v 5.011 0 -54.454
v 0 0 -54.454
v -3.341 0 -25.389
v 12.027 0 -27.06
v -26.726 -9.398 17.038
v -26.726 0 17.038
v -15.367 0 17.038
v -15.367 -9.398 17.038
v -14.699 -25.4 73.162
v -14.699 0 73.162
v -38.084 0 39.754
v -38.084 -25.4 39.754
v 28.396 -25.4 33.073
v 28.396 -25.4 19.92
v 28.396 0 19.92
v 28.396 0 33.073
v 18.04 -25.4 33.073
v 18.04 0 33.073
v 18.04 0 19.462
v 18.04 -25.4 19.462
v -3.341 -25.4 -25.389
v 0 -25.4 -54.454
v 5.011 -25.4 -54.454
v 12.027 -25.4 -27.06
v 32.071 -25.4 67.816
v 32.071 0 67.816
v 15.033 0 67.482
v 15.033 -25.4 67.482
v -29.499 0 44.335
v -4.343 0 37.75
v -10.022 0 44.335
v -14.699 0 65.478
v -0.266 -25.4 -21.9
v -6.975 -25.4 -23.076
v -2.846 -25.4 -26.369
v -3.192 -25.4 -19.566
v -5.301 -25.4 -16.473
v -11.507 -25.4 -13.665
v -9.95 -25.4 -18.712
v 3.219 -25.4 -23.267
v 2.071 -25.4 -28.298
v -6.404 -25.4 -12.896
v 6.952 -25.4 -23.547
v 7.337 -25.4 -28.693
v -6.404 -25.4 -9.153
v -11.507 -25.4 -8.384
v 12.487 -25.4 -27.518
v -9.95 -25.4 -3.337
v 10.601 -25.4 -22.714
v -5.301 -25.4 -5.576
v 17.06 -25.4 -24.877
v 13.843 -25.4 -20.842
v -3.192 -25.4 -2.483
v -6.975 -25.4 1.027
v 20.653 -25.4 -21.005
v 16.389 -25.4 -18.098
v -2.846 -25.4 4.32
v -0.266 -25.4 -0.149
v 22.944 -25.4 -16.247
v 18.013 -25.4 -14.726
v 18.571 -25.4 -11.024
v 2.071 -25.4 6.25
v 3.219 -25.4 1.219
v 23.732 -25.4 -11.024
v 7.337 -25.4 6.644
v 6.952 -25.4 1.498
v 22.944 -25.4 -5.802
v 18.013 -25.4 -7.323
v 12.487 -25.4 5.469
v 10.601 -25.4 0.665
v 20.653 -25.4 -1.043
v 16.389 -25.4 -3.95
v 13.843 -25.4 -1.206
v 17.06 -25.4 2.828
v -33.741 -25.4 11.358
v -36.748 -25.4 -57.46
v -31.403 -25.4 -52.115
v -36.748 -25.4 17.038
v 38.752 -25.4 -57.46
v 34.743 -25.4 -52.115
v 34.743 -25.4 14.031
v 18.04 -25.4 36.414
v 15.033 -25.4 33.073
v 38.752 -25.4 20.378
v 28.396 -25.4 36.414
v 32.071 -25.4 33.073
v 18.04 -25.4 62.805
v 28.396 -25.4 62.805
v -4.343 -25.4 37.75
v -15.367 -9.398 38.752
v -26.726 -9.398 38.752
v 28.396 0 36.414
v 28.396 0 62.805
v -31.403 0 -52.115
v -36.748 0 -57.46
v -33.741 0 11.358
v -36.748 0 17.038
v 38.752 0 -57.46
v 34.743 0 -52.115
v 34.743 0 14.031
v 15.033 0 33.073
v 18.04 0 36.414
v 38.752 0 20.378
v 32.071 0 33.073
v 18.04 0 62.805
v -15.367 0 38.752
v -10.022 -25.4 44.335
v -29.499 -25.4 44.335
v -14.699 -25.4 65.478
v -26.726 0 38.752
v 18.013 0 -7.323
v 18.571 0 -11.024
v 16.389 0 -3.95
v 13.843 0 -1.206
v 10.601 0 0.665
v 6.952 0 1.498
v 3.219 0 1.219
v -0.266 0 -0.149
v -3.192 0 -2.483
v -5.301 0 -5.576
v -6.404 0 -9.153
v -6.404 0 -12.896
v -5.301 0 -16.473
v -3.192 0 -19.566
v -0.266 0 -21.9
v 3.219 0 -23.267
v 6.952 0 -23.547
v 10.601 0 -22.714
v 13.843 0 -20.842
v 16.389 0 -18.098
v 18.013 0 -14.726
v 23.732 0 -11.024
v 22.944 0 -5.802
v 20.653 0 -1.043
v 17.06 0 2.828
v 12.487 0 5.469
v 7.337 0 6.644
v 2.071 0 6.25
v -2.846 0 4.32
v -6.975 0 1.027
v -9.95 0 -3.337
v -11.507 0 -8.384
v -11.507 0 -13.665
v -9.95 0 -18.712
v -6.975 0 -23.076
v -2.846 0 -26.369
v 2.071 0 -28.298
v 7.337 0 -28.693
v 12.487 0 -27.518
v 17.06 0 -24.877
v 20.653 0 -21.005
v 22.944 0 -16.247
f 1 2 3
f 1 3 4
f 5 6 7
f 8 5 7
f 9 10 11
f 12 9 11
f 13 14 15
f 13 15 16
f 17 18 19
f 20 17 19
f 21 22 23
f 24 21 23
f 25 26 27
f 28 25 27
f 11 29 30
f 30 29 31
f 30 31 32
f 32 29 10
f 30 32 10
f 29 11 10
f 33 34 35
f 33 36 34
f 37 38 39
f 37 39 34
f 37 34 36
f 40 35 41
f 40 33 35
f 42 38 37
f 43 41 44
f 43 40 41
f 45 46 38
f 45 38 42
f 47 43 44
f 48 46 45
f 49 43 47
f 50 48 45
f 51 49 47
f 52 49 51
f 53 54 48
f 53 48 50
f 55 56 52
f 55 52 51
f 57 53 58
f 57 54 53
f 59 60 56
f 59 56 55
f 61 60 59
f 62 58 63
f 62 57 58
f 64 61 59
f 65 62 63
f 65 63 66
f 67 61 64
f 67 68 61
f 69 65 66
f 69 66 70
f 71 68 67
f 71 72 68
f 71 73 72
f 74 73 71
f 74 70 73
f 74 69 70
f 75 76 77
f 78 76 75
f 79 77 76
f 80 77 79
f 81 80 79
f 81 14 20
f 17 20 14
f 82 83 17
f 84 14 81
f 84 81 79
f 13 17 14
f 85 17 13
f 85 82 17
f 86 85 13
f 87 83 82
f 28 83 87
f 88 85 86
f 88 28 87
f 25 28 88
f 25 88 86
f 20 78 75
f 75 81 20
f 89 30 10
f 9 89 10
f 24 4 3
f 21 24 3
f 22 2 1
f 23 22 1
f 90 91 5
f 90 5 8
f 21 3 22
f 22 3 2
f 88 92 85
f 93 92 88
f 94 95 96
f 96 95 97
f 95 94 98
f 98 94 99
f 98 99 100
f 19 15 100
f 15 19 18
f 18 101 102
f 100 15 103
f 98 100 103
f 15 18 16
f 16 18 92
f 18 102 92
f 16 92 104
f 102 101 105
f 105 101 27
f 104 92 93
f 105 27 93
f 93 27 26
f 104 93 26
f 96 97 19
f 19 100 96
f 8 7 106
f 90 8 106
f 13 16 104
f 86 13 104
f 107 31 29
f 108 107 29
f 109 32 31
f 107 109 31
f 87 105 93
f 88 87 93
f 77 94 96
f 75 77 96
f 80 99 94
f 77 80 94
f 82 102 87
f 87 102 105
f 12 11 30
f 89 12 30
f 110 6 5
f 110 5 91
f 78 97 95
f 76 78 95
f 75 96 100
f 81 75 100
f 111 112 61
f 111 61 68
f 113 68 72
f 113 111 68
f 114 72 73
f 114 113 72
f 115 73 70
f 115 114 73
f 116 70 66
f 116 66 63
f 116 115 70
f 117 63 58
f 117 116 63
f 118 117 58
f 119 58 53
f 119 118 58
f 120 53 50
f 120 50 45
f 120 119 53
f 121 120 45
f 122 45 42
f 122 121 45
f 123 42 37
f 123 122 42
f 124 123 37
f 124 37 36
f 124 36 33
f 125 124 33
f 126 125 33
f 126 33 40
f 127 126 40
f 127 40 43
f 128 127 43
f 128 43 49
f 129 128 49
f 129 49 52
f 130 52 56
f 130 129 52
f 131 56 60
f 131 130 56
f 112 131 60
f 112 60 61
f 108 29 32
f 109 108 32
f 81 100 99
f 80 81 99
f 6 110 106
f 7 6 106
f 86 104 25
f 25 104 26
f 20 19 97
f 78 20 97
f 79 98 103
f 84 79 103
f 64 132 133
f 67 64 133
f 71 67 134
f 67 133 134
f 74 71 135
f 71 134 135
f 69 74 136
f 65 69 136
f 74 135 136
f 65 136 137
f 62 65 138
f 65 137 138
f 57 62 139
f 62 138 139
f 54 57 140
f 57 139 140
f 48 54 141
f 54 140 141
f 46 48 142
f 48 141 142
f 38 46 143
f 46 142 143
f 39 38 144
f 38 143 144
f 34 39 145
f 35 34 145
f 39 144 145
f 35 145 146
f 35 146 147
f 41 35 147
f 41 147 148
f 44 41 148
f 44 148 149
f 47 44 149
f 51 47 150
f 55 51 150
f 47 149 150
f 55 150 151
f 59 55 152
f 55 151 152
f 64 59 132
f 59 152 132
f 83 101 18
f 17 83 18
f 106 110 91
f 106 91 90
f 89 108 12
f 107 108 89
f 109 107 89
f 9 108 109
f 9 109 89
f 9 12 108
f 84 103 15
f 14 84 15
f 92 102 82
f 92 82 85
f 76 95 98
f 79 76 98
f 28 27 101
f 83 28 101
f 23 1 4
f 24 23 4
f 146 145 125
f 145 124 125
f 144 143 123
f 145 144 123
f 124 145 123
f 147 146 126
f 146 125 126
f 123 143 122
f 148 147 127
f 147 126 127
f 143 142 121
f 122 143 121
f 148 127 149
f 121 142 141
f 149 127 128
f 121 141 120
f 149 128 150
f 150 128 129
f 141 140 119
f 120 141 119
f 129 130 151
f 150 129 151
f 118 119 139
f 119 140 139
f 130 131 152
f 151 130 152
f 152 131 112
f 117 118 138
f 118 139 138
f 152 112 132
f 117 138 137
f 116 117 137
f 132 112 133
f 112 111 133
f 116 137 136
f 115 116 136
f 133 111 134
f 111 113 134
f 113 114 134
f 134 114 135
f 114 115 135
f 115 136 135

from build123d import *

# Parameters (mm, degrees)
F1_DEPTH  = 25.4
F3_DEPTH  = 25.4
F4_W      = 11.358415
F4_H      = 21.714611
F5_DEPTH  = 9.398
F6_R      = 17.718364
F6_R_2    = 12.557692
F7_DEPTH  = 25.4
F9_DEPTH  = 25.4
F10_W     = 10.356202
F10_H     = 26.39161
F11_DEPTH = 25.4


with BuildPart() as f1:
    # F0 (on Front) → F1 (new body)
    with BuildSketch(Plane.XZ):
        Polygon((38.752235, 20.378331), (-36.747809, 17.037621), (-36.747809, -57.460207), (38.752235, -57.460207), align=None)
        Polygon((-31.402674, -52.115075), (-33.741169, 11.358414), (34.743384, 14.030981), (34.743384, -52.115075), align=None, mode=Mode.SUBTRACT)
    extrude(amount=F1_DEPTH)

    # F10 (on Front) → F11 (join)
    with BuildSketch(Plane.XZ):
        Polygon((15.033196, 67.482337), (15.033196, 33.073027), (18.039834, 33.073027), (28.396036, 33.073027), (32.070816, 33.073027), (32.070816, 67.816406), align=None)
        with Locations((23.217935, 49.609542)):
            Rectangle(F10_W, F10_H, mode=Mode.SUBTRACT)
        Polygon((28.396036, 33.073027), (18.039834, 33.073027), (18.039834, 17.705763), (28.396036, 18.373903), align=None)
    extrude(amount=F11_DEPTH)


with BuildPart() as f3:
    # F2 (on Front) → F3 (new body)
    with BuildSketch(Plane.XZ):
        Polygon((-14.699123, 73.161542), (-38.084093, 39.754447), (-4.342924, 37.750021), align=None)
        Polygon((-29.499142, 44.335034), (-14.699123, 65.477915), (-10.02213, 44.335034), align=None, mode=Mode.SUBTRACT)
    extrude(amount=F3_DEPTH)


with BuildPart() as f5:
    # F4 (on Front) → F5 (new body)
    with BuildSketch(Plane.XZ):
        with Locations((-21.046473, 27.894926)):
            Rectangle(F4_W, F4_H)
    extrude(amount=F5_DEPTH)


with BuildPart() as f7:
    # F6 (on Front) → F7 (new body)
    with BuildSketch(Plane.XZ):
        with Locations((6.013276, -11.024343)):
            Circle(F6_R)
        with Locations((6.013276, -11.024343)):
            Circle(F6_R_2, mode=Mode.SUBTRACT)
    extrude(amount=F7_DEPTH)


with BuildPart() as f9:
    # F8 (on Front) → F9 (new body)
    with BuildSketch(Plane.XZ):
        Polygon((12.026555, -27.059751), (-3.340709, -25.389396), (0, -54.45357), (5.011065, -54.45357), align=None)
    extrude(amount=F9_DEPTH)


solid = Compound([f1.part, f3.part, f5.part, f7.part, f9.part])
